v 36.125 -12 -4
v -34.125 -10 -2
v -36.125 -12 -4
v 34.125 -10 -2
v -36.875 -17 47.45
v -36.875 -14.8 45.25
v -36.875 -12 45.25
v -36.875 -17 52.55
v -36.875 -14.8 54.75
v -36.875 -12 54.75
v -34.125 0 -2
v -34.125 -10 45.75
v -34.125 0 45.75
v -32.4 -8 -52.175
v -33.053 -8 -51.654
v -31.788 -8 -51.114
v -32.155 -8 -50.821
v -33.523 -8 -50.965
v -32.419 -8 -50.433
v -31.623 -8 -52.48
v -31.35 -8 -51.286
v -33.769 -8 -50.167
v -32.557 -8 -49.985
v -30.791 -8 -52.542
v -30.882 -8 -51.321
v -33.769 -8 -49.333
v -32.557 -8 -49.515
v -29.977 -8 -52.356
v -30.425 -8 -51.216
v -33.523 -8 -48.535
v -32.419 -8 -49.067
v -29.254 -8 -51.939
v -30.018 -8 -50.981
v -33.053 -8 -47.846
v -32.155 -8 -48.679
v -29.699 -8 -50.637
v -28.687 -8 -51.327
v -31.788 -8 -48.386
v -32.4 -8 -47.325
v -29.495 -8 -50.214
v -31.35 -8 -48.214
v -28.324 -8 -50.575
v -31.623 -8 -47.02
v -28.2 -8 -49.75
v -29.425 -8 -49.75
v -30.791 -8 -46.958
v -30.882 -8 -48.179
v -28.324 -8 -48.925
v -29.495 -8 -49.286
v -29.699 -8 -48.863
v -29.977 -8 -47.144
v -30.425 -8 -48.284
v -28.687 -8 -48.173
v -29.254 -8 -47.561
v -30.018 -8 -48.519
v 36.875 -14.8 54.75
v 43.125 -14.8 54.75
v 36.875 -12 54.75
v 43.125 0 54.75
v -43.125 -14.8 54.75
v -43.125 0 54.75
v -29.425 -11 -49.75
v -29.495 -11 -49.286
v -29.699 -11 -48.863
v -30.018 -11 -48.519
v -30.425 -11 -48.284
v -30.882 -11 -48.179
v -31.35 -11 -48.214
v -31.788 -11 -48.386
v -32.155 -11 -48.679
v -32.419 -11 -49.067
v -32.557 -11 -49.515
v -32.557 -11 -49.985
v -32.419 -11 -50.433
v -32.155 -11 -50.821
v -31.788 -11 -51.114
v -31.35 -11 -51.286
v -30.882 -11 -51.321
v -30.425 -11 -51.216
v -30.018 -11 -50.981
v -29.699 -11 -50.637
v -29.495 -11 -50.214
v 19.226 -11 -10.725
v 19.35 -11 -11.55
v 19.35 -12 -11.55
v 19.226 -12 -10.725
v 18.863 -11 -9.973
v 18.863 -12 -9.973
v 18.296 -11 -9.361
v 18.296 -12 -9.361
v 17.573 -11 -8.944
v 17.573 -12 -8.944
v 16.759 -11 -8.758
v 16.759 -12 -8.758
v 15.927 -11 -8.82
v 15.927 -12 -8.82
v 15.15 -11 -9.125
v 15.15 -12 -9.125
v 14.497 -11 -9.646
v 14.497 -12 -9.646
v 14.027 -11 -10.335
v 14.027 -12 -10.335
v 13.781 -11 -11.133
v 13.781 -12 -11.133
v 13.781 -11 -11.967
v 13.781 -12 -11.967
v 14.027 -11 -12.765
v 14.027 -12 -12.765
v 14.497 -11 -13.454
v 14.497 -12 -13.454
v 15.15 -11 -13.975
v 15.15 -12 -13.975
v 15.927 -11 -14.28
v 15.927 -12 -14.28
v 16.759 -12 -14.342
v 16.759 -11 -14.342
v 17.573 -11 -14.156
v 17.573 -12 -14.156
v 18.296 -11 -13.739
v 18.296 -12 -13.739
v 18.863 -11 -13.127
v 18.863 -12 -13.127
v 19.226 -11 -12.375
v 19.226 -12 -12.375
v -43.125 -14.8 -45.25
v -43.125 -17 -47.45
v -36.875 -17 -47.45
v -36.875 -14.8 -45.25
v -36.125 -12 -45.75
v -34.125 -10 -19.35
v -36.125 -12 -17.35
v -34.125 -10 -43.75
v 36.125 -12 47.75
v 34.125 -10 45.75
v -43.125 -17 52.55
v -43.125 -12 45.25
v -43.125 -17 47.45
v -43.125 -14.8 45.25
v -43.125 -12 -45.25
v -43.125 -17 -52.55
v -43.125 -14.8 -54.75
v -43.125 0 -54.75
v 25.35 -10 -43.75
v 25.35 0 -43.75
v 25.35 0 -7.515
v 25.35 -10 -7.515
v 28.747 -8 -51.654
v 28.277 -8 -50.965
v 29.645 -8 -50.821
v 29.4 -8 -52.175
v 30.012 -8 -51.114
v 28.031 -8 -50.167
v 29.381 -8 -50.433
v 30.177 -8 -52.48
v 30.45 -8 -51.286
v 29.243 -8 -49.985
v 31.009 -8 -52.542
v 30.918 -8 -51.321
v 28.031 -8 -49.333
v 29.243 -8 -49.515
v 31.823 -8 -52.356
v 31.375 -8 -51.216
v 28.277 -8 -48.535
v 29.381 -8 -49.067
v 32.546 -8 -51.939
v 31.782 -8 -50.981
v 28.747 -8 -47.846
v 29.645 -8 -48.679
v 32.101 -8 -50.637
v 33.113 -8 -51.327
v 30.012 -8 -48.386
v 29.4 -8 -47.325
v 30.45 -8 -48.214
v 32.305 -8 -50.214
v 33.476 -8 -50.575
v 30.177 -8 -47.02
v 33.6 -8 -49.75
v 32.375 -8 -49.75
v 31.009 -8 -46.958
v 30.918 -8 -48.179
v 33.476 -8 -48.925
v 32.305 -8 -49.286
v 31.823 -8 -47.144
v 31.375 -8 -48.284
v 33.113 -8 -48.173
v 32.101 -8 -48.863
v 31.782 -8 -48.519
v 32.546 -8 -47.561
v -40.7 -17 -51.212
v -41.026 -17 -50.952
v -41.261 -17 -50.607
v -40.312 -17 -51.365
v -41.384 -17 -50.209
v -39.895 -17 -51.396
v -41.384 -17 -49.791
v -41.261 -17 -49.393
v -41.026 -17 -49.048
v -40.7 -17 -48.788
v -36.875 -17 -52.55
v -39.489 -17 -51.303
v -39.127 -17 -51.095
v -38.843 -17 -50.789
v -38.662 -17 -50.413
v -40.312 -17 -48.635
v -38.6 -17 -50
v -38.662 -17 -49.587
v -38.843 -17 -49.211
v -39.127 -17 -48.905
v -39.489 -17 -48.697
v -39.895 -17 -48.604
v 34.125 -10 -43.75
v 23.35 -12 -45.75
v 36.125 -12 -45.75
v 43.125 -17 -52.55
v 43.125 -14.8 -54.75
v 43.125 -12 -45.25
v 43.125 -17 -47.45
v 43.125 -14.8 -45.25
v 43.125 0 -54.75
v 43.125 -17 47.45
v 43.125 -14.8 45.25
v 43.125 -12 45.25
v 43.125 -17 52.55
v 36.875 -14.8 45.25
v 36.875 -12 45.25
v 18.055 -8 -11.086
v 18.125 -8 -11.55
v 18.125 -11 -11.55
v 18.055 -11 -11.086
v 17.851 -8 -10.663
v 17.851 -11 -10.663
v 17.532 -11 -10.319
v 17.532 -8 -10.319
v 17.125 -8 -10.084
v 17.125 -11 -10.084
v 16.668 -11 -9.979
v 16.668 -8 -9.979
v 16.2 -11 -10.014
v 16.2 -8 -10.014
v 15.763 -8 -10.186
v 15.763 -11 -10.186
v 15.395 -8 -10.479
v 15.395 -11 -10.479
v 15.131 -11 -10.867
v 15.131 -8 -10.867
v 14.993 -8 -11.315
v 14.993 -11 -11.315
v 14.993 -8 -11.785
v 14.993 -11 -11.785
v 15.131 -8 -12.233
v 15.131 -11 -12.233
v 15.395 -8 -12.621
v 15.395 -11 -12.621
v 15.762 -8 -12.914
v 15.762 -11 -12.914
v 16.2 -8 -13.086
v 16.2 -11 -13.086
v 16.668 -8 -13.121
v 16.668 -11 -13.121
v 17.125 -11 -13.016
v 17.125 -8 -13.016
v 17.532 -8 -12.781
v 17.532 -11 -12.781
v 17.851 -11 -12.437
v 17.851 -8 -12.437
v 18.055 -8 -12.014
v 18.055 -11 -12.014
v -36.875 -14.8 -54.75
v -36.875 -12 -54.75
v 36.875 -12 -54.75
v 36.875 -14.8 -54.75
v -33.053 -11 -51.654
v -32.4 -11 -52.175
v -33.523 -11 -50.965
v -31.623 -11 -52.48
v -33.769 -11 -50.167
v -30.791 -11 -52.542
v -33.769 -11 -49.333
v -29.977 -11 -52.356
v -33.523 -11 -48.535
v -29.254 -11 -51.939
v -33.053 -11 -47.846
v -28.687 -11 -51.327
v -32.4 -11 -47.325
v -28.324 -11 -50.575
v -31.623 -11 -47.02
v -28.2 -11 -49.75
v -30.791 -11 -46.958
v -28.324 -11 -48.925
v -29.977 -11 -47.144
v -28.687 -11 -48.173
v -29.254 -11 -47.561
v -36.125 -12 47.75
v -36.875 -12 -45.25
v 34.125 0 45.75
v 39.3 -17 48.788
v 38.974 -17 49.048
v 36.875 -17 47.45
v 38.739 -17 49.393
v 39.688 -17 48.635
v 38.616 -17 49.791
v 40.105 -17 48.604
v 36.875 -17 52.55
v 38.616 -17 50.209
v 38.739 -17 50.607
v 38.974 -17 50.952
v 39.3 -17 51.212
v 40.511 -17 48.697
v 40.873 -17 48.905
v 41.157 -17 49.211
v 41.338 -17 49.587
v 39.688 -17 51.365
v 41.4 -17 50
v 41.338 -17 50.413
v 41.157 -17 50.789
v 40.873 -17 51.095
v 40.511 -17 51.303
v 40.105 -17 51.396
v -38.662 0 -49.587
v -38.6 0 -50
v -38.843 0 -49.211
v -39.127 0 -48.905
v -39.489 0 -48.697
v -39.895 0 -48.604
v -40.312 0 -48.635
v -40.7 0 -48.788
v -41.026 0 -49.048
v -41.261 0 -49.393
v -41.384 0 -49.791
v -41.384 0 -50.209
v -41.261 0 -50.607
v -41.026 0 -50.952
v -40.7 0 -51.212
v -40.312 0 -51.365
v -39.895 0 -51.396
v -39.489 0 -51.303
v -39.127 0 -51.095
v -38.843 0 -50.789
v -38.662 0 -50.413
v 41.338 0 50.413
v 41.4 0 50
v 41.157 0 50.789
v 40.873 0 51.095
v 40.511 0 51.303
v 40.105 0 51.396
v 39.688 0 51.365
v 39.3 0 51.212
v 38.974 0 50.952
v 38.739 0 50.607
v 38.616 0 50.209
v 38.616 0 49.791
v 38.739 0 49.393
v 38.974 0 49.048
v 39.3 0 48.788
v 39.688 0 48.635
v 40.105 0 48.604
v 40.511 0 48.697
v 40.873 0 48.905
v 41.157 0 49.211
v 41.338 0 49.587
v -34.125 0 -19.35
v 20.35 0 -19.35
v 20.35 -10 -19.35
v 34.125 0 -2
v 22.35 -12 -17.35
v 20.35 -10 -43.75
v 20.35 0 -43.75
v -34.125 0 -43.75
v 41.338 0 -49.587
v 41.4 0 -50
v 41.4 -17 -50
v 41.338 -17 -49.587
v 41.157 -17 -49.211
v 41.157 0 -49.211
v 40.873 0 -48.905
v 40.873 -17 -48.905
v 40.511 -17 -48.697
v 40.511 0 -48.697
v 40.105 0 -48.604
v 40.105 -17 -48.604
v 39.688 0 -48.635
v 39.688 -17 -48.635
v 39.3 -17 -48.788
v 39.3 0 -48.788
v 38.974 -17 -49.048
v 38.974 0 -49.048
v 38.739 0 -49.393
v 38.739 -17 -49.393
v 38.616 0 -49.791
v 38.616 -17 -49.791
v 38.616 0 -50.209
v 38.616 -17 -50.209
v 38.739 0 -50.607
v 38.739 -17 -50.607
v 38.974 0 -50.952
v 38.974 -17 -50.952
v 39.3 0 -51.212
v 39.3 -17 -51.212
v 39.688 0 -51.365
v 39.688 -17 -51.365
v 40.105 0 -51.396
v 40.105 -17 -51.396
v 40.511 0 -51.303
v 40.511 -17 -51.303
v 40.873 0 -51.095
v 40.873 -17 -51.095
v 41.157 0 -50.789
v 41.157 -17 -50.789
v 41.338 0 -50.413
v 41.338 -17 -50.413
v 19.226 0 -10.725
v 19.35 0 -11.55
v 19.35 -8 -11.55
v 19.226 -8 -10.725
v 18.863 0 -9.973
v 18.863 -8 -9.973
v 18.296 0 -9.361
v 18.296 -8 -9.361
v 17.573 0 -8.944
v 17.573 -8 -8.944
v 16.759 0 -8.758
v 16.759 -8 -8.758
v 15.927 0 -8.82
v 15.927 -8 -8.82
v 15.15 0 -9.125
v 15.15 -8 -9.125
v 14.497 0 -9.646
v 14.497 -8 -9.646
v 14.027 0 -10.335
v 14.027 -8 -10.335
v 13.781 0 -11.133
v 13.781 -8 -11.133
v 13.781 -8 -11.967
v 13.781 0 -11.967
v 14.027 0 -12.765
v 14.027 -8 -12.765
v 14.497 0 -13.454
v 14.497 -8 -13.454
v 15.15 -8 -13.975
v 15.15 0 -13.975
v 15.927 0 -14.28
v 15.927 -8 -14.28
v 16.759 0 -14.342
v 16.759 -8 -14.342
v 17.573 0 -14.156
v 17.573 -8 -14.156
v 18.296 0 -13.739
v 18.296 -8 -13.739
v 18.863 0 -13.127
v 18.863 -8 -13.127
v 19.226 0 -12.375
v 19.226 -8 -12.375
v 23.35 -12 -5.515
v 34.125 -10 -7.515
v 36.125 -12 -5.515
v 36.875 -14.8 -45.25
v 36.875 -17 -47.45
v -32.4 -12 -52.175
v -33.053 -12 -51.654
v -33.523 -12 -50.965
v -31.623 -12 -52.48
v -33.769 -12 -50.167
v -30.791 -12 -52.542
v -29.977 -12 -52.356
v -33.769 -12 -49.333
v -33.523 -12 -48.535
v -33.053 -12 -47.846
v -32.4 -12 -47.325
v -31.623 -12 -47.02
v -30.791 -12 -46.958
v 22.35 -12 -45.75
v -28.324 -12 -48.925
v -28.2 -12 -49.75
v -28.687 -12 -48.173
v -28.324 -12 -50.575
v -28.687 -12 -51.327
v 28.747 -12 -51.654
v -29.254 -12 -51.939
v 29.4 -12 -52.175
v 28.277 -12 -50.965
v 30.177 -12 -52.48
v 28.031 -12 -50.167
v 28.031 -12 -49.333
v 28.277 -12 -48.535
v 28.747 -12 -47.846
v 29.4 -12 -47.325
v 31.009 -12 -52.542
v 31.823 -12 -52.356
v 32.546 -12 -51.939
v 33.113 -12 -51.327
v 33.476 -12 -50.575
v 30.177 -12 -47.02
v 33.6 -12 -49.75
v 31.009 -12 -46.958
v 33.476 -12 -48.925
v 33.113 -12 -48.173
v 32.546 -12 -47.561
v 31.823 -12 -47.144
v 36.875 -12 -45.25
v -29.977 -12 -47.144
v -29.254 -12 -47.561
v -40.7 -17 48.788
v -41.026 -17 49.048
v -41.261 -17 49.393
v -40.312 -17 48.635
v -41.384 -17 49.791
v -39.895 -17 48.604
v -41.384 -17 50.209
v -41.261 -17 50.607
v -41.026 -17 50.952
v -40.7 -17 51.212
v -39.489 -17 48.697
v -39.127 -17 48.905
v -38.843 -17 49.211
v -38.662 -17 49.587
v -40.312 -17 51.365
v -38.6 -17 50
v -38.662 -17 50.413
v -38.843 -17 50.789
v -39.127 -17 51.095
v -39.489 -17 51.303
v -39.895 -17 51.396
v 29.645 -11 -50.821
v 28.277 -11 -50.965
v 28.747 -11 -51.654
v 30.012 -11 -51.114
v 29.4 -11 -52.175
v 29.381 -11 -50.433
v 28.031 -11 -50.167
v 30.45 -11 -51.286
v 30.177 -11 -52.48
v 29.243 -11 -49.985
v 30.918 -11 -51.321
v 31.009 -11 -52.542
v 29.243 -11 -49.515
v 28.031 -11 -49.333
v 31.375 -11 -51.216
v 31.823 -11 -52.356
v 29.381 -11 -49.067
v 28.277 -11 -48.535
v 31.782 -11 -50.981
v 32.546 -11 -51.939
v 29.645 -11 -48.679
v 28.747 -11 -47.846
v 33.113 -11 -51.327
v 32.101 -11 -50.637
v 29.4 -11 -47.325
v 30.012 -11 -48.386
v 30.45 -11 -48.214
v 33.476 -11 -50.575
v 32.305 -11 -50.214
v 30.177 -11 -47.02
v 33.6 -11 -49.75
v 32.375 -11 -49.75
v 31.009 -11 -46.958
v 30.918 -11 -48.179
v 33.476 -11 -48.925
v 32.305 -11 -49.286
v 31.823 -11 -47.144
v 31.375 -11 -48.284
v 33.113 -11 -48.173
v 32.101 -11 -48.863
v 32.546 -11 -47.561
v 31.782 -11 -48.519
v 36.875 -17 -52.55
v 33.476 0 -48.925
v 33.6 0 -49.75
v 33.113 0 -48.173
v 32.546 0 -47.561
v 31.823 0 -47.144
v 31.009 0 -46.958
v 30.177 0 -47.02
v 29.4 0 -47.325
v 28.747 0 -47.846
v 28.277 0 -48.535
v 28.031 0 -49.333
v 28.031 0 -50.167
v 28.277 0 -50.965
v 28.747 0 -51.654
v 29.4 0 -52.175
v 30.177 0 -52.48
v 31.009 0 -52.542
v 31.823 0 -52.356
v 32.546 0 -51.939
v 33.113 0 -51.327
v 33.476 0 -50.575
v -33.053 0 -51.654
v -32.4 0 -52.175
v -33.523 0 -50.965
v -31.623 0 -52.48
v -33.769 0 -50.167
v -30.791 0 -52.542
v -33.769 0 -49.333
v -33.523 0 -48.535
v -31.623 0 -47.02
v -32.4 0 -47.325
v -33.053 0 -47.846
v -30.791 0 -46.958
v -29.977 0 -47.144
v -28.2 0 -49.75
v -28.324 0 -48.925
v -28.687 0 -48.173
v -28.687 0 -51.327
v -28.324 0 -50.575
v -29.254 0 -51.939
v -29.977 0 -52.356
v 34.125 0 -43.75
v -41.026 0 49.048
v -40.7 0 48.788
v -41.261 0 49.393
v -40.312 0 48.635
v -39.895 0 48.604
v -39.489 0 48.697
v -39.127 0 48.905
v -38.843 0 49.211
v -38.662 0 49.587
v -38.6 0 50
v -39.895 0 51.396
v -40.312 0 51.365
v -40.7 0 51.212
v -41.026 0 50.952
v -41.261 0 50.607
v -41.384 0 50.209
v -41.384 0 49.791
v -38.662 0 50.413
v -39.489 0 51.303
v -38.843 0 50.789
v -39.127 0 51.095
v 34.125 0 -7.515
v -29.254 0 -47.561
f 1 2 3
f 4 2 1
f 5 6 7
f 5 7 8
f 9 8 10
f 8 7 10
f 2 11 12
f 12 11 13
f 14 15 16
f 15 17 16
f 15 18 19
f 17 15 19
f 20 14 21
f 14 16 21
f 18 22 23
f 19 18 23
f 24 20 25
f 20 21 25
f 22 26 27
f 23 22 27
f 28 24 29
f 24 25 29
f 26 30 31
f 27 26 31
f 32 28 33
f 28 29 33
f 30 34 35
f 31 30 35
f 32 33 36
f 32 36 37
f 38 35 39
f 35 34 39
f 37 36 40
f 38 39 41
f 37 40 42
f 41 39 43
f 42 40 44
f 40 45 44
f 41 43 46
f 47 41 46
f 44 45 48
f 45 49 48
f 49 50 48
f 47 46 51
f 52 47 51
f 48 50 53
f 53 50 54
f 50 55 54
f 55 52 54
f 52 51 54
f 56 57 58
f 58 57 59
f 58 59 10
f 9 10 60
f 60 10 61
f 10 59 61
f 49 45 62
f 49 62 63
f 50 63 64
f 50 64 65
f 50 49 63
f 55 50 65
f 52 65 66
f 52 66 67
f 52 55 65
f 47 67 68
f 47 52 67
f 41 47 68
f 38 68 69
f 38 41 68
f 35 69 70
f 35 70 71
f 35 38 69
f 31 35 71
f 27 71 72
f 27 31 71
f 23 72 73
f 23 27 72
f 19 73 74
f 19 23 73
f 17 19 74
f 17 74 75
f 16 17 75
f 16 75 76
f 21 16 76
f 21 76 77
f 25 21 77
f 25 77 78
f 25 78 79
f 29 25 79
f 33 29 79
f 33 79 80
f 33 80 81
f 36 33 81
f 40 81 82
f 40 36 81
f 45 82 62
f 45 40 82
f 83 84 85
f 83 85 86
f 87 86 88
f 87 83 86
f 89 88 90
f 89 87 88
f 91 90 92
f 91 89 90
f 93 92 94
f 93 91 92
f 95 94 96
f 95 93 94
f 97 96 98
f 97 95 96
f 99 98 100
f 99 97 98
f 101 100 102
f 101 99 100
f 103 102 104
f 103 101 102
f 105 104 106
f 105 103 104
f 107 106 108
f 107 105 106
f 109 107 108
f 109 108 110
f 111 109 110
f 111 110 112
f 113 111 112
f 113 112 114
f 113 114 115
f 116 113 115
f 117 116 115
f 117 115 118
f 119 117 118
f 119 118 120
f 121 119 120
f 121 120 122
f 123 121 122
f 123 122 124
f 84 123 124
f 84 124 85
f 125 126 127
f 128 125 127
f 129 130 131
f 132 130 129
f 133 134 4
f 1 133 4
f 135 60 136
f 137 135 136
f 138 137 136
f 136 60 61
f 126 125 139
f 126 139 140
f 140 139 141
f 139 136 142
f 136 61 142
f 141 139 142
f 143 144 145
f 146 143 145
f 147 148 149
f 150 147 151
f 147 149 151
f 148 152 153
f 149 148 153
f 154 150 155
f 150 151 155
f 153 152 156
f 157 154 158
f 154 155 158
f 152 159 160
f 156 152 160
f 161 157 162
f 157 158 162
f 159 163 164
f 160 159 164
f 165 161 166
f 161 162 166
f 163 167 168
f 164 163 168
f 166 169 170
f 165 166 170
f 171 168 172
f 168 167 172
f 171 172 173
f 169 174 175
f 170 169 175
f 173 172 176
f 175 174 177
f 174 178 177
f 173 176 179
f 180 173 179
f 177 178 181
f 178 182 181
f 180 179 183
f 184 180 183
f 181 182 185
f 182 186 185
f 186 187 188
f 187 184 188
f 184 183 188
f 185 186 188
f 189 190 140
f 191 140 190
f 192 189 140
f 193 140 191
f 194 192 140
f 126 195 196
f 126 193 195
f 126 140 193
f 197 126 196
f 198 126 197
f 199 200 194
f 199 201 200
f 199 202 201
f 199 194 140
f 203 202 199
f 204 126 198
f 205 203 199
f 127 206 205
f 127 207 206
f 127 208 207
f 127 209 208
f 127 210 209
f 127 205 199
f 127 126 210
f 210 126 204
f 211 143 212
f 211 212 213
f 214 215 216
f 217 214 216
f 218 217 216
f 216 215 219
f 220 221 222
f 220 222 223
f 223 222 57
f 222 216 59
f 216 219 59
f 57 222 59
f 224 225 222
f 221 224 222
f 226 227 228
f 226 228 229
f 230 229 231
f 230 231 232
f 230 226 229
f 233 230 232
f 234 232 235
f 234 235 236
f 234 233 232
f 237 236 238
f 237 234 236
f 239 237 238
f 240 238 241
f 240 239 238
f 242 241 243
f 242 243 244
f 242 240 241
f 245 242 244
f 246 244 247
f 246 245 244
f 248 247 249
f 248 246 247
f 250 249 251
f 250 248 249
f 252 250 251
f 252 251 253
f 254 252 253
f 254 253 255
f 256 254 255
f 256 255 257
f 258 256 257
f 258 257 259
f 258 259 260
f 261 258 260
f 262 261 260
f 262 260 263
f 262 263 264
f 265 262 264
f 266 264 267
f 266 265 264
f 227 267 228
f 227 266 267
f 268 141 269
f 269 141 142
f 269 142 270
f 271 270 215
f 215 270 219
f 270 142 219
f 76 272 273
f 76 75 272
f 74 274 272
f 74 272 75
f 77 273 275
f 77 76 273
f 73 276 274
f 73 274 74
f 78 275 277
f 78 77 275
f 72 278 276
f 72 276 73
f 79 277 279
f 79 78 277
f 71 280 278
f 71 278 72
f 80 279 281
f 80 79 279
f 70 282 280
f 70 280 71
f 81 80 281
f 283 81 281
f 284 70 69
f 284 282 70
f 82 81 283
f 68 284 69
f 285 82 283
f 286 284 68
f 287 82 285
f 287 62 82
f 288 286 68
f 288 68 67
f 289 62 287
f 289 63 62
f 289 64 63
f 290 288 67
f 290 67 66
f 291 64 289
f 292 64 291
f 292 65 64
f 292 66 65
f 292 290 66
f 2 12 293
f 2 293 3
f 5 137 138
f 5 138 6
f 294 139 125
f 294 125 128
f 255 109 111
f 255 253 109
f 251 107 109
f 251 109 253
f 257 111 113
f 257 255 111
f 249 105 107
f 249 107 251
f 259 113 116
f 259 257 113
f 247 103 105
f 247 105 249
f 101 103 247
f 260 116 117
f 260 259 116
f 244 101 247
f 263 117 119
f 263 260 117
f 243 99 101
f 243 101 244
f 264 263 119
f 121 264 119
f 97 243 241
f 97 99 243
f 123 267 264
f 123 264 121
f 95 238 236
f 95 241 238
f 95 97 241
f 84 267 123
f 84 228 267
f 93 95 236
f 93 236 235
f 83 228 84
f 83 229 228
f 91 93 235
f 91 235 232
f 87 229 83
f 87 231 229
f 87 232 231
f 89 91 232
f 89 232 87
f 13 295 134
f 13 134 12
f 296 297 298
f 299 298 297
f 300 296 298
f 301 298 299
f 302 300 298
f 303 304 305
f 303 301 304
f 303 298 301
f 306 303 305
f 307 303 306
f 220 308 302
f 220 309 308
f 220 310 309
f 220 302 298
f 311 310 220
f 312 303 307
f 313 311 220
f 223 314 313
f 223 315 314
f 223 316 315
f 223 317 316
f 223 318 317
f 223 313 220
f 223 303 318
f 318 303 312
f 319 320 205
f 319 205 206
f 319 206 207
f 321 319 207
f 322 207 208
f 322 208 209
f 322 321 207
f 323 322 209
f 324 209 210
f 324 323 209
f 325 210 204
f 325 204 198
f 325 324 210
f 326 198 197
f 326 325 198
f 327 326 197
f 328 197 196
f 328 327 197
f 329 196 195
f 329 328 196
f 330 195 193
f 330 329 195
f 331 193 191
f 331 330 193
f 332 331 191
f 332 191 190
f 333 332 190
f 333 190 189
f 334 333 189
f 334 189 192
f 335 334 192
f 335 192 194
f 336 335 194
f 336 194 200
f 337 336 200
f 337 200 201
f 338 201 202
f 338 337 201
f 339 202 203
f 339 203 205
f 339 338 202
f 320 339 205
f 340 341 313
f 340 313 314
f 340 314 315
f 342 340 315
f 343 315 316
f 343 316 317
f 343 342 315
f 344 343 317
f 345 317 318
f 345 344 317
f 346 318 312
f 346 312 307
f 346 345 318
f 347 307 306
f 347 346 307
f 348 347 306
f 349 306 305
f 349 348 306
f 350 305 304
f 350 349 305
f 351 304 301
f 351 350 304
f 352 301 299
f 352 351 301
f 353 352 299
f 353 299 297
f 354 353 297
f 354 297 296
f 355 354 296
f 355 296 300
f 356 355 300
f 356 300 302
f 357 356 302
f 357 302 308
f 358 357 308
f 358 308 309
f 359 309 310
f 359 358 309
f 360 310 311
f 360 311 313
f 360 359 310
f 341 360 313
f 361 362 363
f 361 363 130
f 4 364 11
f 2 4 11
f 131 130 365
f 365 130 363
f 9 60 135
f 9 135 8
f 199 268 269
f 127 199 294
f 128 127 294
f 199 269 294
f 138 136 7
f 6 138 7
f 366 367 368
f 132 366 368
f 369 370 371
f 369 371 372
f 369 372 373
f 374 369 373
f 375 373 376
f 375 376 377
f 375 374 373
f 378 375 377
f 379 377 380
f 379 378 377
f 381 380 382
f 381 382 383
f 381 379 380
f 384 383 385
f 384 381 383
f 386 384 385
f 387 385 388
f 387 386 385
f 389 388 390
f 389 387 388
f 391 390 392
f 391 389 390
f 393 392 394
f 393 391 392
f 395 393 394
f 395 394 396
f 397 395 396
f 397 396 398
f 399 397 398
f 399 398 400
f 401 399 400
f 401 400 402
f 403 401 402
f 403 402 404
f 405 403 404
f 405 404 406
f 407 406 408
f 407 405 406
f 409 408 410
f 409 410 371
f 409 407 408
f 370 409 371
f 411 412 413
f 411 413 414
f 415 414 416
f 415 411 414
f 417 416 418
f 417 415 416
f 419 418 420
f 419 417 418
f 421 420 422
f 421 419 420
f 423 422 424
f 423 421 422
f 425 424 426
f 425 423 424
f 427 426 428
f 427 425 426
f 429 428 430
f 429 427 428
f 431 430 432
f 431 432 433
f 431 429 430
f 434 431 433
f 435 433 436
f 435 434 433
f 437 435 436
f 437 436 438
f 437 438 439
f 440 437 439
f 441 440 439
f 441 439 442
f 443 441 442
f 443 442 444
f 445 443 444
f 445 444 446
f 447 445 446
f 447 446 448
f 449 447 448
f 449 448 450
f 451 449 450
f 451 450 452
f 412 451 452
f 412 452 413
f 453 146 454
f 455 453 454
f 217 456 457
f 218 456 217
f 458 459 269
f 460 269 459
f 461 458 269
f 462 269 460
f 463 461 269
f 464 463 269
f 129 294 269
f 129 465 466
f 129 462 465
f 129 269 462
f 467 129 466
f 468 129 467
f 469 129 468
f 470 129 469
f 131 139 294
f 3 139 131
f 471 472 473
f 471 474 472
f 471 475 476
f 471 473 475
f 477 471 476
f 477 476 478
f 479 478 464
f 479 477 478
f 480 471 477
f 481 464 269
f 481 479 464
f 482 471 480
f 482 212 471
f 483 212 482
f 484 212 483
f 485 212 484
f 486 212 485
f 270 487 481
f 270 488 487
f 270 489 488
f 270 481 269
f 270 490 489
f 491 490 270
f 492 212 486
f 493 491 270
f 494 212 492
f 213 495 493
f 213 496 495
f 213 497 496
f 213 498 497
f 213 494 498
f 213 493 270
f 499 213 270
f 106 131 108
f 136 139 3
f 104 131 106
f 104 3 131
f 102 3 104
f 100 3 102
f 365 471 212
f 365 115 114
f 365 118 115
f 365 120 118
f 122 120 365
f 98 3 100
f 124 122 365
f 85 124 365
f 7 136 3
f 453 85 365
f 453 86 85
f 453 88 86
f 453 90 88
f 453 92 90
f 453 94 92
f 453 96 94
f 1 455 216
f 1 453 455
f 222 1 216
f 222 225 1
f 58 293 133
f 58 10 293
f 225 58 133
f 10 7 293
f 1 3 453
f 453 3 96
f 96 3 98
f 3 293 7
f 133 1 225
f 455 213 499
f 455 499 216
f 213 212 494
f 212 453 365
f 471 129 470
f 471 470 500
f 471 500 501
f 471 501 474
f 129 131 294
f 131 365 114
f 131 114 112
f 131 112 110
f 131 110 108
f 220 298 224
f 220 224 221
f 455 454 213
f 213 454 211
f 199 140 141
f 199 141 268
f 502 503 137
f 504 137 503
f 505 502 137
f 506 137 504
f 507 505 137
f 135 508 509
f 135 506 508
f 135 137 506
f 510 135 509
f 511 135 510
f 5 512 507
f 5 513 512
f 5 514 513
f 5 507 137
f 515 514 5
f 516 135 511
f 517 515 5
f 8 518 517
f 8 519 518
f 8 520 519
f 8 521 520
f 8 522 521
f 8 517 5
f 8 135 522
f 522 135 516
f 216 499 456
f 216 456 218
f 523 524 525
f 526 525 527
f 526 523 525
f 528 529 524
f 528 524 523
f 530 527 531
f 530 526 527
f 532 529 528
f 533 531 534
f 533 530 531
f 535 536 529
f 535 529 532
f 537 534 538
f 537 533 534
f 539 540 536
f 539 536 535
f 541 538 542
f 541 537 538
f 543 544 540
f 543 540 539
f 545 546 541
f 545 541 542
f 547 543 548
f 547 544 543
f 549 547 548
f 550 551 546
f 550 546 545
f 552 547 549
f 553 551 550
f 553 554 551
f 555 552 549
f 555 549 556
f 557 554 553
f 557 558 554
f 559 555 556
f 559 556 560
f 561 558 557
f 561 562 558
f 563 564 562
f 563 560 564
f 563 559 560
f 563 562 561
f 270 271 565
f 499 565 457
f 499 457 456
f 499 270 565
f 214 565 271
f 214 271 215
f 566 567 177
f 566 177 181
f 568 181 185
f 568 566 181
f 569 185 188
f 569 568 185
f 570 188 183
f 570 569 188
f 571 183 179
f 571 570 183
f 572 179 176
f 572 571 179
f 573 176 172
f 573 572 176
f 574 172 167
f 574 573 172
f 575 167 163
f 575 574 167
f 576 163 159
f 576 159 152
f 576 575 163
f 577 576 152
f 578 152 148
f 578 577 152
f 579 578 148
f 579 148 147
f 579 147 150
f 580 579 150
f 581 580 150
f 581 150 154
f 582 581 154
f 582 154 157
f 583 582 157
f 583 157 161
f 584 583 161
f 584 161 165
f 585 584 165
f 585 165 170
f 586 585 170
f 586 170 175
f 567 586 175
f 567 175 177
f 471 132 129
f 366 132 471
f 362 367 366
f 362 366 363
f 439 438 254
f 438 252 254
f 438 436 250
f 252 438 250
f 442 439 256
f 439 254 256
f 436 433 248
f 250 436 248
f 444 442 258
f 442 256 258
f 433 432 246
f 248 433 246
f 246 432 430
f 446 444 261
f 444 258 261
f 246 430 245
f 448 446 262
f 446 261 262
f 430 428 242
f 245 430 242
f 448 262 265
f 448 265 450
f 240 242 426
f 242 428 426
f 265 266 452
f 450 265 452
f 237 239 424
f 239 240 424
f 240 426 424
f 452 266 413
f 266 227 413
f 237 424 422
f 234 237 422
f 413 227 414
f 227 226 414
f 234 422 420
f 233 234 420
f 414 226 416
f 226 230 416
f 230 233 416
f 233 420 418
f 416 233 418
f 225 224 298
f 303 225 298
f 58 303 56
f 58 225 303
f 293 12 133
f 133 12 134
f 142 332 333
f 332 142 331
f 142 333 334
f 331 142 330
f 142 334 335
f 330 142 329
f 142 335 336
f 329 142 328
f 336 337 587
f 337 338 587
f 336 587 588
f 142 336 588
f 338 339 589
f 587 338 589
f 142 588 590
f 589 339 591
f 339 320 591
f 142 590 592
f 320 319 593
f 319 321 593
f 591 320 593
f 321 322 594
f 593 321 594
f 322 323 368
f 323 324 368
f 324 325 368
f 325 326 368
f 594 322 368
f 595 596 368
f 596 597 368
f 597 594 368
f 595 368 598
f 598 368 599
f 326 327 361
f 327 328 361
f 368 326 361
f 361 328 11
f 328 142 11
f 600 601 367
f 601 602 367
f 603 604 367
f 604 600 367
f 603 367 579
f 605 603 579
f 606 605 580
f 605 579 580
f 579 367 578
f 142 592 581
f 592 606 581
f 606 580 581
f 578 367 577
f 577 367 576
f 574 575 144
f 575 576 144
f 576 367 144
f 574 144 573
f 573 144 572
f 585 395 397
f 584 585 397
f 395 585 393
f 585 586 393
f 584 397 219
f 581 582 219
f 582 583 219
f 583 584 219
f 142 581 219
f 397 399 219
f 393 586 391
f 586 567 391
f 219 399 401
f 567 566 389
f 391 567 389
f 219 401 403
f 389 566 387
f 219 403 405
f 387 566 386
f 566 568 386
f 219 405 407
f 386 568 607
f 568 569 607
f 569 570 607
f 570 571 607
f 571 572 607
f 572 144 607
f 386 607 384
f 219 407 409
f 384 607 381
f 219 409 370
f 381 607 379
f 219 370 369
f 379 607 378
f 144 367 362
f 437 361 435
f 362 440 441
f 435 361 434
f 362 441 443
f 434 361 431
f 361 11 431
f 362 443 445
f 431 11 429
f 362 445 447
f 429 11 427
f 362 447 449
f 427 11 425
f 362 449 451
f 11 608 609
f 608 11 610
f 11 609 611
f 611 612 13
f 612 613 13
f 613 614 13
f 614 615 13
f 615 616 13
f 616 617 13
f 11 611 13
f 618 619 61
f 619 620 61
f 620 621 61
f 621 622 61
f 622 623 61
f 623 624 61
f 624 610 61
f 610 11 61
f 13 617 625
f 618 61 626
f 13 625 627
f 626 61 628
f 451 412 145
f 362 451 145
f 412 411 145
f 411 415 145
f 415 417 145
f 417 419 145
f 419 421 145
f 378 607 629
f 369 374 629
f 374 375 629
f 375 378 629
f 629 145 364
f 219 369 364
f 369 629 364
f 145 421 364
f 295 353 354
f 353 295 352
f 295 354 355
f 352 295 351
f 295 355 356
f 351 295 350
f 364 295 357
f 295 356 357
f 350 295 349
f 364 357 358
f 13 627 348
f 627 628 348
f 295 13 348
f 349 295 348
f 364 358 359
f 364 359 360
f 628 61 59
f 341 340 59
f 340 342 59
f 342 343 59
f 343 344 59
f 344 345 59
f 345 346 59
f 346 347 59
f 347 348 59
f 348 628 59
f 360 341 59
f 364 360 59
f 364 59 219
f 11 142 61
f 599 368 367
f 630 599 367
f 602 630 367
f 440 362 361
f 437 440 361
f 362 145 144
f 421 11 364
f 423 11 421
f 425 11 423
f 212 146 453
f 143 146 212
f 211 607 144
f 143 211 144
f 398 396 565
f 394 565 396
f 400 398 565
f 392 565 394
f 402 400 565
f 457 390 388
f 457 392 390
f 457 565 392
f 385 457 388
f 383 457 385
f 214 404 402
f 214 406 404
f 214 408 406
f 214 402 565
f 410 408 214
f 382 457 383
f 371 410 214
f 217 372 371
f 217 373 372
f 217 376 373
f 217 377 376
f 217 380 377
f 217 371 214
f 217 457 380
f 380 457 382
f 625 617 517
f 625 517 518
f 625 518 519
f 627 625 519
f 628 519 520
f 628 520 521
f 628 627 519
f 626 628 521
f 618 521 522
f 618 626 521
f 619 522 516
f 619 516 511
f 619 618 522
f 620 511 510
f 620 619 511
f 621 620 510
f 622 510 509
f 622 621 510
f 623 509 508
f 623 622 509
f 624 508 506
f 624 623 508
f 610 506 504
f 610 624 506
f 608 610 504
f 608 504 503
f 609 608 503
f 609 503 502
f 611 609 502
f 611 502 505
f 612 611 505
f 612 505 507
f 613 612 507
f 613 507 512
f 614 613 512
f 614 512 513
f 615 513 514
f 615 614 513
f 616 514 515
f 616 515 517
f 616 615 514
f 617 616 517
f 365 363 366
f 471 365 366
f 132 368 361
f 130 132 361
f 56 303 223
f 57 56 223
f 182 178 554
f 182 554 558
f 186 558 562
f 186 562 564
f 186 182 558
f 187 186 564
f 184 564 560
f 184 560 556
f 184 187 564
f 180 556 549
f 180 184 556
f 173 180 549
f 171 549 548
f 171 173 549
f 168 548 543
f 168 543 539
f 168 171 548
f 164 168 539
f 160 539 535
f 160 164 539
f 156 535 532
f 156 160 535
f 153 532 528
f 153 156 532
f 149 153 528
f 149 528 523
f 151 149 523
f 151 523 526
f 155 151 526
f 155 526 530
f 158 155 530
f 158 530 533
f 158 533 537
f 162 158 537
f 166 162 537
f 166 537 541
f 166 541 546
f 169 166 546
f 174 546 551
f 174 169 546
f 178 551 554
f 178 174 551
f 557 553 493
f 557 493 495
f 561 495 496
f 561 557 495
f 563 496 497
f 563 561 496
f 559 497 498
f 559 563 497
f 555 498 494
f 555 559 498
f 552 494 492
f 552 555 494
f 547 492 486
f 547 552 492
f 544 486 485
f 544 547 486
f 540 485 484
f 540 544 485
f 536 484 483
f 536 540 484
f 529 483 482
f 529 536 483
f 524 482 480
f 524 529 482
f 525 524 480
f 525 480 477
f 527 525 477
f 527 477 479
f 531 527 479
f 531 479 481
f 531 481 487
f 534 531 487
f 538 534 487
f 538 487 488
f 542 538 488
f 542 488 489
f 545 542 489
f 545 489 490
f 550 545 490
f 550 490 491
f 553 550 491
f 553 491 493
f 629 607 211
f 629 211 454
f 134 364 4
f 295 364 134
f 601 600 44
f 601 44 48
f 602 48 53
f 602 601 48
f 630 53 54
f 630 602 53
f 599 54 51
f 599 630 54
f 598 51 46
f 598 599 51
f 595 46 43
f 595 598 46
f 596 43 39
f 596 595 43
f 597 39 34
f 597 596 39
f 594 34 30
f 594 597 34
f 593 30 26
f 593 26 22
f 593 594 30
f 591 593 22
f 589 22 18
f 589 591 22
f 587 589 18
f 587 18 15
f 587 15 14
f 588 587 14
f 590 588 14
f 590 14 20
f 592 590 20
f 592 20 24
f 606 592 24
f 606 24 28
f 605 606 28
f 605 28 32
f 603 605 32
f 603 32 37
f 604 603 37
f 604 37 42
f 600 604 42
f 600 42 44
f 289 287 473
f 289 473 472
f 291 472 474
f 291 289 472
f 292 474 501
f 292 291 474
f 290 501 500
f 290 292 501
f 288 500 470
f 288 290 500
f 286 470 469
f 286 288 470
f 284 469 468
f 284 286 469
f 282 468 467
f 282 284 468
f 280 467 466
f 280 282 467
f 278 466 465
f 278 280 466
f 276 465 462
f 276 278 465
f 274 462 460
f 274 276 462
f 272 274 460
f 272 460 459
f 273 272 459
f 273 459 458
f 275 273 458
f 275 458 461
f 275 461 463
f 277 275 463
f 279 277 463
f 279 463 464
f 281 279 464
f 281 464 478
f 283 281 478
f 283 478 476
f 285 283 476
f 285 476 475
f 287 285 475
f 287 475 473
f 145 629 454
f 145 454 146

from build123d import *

# Parameters (mm, degrees)
F0_R     = 2.8
F1_DEPTH = 12
F0_W     = 6.25
F0_H     = 9.5
F0_R_2   = 1.4
F2_DEPTH = 17
F3_SIZE  = 2.2
F4_START = 8
F0_R_3   = 1.575
F4_DEPTH = 3
F5_W     = 68.25
F5_H     = 47.75
F5_W_2   = 8.775
F5_H_2   = 36.234842279
F5_W_3   = 54.475
F5_H_3   = 24.4
F6_DEPTH = 28
F7_SIZE  = 2


# Not quite as in the source:
# - a feature names something its author has since deleted; it is built from what else it names


with BuildPart() as f1:
    # F0 (on Front) → F1 (new body)
    with BuildSketch(Plane.XZ):
        Polygon((-36.875, -54.75), (36.875, -54.75), (36.875, -45.25), (43.125, -45.25), (43.125, 45.25), (36.875, 45.25), (36.875, 54.75), (-36.875, 54.75), (-36.875, 45.25), (-43.125, 45.25), (-43.125, -45.25), (-36.875, -45.25), align=None)
        with Locations((-31, -49.75)):
            Circle(F0_R, mode=Mode.SUBTRACT)
        with Locations((30.8, -49.75)):
            Circle(F0_R, mode=Mode.SUBTRACT)
        with Locations((16.55, -11.55)):
            Circle(F0_R, mode=Mode.SUBTRACT)
    extrude(amount=F1_DEPTH)

    # F0 (on Front) → F2 (join)
    with BuildSketch(Plane.XZ):
        with Locations((40, -50)):
            Rectangle(F0_W, F0_H)
        Polygon((40, -46.4492958445), (43.075, -48.2246479222), (43.075, -51.7753520778), (40, -53.5507041555), (36.925, -51.7753520778), (36.925, -48.2246479222), align=None, mode=Mode.SUBTRACT)
        with Locations((-40, -50)):
            Rectangle(F0_W, F0_H)
        Polygon((-40, -46.4492958445), (-36.925, -48.2246479222), (-36.925, -51.7753520778), (-40, -53.5507041555), (-43.075, -51.7753520778), (-43.075, -48.2246479222), align=None, mode=Mode.SUBTRACT)
        with Locations((-40, 50)):
            Rectangle(F0_W, F0_H)
        Polygon((-40, 53.5507041555), (-36.925, 51.7753520778), (-36.925, 48.2246479222), (-40, 46.4492958445), (-43.075, 48.2246479222), (-43.075, 51.7753520778), align=None, mode=Mode.SUBTRACT)
        with Locations((40, 50)):
            Rectangle(F0_W, F0_H)
        Polygon((40, 46.4492958445), (36.925, 48.2246479222), (36.925, 51.7753520778), (40, 53.5507041555), (43.075, 51.7753520778), (43.075, 48.2246479222), align=None, mode=Mode.SUBTRACT)
        Polygon((-36.925, -51.7753520778), (-36.925, -48.2246479222), (-40, -46.4492958445), (-43.075, -48.2246479222), (-43.075, -51.7753520778), (-40, -53.5507041555), align=None)
        with Locations((-40, -50)):
            Circle(F0_R_2, mode=Mode.SUBTRACT)
        Polygon((43.075, -51.7753520778), (43.075, -48.2246479222), (40, -46.4492958445), (36.925, -48.2246479222), (36.925, -51.7753520778), (40, -53.5507041555), align=None)
        with Locations((40, -50)):
            Circle(F0_R_2, mode=Mode.SUBTRACT)
        Polygon((36.925, 51.7753520778), (36.925, 48.2246479222), (40, 46.4492958445), (43.075, 48.2246479222), (43.075, 51.7753520778), (40, 53.5507041555), align=None)
        with Locations((40, 50)):
            Circle(F0_R_2, mode=Mode.SUBTRACT)
        Polygon((-36.925, 48.2246479222), (-36.925, 51.7753520778), (-40, 53.5507041555), (-43.075, 51.7753520778), (-43.075, 48.2246479222), (-40, 46.4492958445), align=None)
        with Locations((-40, 50)):
            Circle(F0_R_2, mode=Mode.SUBTRACT)
    extrude(amount=F2_DEPTH)

    # F3
    f3_edges = [f1.edges().sort_by_distance(p)[0] for p in [
        (-40, -17, -45.25),
        (-40, -17, -54.75),
        (40, -17, -45.25),
        (40, -17, -54.75),
        (-40, -17, 54.75),
        (-40, -17, 45.25),
        (40, -17, 54.75),
        (40, -17, 45.25),
    ]]
    chamfer(f3_edges, length=F3_SIZE)

    # F0 (on Front) → F4 (join)
    with BuildSketch(Plane.XZ.offset(F4_START)):
        with Locations((16.55, -11.55)):
            Circle(F0_R)
        with Locations((16.55, -11.55)):
            Circle(F0_R_3, mode=Mode.SUBTRACT)
        with Locations((30.8, -49.75)):
            Circle(F0_R)
        with Locations((30.8, -49.75)):
            Circle(F0_R_3, mode=Mode.SUBTRACT)
        with Locations((-31, -49.75)):
            Circle(F0_R)
        with Locations((-31, -49.75)):
            Circle(F0_R_3, mode=Mode.SUBTRACT)
    extrude(amount=F4_DEPTH)

    # F5 (on face) → F6 (cut)
    with BuildSketch(Plane(origin=(0, 0, 0), x_dir=(-1, 0, 0), z_dir=(0, 1, 0))):
        with Locations((0, 21.875)):
            Rectangle(F5_W, F5_H)
        with Locations((-29.7375, -25.6325788605)):
            Rectangle(F5_W_2, F5_H_2)
        with Locations((6.8875, -31.55)):
            Rectangle(F5_W_3, F5_H_3)
    extrude(amount=-F6_DEPTH, mode=Mode.SUBTRACT)

    # F7
    f7_edges = [f1.edges().sort_by_distance(p)[0] for p in [
        (0, -12, -2),
        (-34.125, -12, 21.875),
        (0, -12, 45.75),
        (34.125, -12, 21.875),
        (34.125, -12, -25.632579),
        (29.7375, -12, -7.515158),
        (25.35, -12, -25.632579),
        (29.7375, -12, -43.75),
        (-6.8875, -12, -43.75),
        (20.35, -12, -31.55),
        (-6.8875, -12, -19.35),
        (-34.125, -12, -31.55),
    ]]
    chamfer(f7_edges, length=F7_SIZE)


solid = f1.part
